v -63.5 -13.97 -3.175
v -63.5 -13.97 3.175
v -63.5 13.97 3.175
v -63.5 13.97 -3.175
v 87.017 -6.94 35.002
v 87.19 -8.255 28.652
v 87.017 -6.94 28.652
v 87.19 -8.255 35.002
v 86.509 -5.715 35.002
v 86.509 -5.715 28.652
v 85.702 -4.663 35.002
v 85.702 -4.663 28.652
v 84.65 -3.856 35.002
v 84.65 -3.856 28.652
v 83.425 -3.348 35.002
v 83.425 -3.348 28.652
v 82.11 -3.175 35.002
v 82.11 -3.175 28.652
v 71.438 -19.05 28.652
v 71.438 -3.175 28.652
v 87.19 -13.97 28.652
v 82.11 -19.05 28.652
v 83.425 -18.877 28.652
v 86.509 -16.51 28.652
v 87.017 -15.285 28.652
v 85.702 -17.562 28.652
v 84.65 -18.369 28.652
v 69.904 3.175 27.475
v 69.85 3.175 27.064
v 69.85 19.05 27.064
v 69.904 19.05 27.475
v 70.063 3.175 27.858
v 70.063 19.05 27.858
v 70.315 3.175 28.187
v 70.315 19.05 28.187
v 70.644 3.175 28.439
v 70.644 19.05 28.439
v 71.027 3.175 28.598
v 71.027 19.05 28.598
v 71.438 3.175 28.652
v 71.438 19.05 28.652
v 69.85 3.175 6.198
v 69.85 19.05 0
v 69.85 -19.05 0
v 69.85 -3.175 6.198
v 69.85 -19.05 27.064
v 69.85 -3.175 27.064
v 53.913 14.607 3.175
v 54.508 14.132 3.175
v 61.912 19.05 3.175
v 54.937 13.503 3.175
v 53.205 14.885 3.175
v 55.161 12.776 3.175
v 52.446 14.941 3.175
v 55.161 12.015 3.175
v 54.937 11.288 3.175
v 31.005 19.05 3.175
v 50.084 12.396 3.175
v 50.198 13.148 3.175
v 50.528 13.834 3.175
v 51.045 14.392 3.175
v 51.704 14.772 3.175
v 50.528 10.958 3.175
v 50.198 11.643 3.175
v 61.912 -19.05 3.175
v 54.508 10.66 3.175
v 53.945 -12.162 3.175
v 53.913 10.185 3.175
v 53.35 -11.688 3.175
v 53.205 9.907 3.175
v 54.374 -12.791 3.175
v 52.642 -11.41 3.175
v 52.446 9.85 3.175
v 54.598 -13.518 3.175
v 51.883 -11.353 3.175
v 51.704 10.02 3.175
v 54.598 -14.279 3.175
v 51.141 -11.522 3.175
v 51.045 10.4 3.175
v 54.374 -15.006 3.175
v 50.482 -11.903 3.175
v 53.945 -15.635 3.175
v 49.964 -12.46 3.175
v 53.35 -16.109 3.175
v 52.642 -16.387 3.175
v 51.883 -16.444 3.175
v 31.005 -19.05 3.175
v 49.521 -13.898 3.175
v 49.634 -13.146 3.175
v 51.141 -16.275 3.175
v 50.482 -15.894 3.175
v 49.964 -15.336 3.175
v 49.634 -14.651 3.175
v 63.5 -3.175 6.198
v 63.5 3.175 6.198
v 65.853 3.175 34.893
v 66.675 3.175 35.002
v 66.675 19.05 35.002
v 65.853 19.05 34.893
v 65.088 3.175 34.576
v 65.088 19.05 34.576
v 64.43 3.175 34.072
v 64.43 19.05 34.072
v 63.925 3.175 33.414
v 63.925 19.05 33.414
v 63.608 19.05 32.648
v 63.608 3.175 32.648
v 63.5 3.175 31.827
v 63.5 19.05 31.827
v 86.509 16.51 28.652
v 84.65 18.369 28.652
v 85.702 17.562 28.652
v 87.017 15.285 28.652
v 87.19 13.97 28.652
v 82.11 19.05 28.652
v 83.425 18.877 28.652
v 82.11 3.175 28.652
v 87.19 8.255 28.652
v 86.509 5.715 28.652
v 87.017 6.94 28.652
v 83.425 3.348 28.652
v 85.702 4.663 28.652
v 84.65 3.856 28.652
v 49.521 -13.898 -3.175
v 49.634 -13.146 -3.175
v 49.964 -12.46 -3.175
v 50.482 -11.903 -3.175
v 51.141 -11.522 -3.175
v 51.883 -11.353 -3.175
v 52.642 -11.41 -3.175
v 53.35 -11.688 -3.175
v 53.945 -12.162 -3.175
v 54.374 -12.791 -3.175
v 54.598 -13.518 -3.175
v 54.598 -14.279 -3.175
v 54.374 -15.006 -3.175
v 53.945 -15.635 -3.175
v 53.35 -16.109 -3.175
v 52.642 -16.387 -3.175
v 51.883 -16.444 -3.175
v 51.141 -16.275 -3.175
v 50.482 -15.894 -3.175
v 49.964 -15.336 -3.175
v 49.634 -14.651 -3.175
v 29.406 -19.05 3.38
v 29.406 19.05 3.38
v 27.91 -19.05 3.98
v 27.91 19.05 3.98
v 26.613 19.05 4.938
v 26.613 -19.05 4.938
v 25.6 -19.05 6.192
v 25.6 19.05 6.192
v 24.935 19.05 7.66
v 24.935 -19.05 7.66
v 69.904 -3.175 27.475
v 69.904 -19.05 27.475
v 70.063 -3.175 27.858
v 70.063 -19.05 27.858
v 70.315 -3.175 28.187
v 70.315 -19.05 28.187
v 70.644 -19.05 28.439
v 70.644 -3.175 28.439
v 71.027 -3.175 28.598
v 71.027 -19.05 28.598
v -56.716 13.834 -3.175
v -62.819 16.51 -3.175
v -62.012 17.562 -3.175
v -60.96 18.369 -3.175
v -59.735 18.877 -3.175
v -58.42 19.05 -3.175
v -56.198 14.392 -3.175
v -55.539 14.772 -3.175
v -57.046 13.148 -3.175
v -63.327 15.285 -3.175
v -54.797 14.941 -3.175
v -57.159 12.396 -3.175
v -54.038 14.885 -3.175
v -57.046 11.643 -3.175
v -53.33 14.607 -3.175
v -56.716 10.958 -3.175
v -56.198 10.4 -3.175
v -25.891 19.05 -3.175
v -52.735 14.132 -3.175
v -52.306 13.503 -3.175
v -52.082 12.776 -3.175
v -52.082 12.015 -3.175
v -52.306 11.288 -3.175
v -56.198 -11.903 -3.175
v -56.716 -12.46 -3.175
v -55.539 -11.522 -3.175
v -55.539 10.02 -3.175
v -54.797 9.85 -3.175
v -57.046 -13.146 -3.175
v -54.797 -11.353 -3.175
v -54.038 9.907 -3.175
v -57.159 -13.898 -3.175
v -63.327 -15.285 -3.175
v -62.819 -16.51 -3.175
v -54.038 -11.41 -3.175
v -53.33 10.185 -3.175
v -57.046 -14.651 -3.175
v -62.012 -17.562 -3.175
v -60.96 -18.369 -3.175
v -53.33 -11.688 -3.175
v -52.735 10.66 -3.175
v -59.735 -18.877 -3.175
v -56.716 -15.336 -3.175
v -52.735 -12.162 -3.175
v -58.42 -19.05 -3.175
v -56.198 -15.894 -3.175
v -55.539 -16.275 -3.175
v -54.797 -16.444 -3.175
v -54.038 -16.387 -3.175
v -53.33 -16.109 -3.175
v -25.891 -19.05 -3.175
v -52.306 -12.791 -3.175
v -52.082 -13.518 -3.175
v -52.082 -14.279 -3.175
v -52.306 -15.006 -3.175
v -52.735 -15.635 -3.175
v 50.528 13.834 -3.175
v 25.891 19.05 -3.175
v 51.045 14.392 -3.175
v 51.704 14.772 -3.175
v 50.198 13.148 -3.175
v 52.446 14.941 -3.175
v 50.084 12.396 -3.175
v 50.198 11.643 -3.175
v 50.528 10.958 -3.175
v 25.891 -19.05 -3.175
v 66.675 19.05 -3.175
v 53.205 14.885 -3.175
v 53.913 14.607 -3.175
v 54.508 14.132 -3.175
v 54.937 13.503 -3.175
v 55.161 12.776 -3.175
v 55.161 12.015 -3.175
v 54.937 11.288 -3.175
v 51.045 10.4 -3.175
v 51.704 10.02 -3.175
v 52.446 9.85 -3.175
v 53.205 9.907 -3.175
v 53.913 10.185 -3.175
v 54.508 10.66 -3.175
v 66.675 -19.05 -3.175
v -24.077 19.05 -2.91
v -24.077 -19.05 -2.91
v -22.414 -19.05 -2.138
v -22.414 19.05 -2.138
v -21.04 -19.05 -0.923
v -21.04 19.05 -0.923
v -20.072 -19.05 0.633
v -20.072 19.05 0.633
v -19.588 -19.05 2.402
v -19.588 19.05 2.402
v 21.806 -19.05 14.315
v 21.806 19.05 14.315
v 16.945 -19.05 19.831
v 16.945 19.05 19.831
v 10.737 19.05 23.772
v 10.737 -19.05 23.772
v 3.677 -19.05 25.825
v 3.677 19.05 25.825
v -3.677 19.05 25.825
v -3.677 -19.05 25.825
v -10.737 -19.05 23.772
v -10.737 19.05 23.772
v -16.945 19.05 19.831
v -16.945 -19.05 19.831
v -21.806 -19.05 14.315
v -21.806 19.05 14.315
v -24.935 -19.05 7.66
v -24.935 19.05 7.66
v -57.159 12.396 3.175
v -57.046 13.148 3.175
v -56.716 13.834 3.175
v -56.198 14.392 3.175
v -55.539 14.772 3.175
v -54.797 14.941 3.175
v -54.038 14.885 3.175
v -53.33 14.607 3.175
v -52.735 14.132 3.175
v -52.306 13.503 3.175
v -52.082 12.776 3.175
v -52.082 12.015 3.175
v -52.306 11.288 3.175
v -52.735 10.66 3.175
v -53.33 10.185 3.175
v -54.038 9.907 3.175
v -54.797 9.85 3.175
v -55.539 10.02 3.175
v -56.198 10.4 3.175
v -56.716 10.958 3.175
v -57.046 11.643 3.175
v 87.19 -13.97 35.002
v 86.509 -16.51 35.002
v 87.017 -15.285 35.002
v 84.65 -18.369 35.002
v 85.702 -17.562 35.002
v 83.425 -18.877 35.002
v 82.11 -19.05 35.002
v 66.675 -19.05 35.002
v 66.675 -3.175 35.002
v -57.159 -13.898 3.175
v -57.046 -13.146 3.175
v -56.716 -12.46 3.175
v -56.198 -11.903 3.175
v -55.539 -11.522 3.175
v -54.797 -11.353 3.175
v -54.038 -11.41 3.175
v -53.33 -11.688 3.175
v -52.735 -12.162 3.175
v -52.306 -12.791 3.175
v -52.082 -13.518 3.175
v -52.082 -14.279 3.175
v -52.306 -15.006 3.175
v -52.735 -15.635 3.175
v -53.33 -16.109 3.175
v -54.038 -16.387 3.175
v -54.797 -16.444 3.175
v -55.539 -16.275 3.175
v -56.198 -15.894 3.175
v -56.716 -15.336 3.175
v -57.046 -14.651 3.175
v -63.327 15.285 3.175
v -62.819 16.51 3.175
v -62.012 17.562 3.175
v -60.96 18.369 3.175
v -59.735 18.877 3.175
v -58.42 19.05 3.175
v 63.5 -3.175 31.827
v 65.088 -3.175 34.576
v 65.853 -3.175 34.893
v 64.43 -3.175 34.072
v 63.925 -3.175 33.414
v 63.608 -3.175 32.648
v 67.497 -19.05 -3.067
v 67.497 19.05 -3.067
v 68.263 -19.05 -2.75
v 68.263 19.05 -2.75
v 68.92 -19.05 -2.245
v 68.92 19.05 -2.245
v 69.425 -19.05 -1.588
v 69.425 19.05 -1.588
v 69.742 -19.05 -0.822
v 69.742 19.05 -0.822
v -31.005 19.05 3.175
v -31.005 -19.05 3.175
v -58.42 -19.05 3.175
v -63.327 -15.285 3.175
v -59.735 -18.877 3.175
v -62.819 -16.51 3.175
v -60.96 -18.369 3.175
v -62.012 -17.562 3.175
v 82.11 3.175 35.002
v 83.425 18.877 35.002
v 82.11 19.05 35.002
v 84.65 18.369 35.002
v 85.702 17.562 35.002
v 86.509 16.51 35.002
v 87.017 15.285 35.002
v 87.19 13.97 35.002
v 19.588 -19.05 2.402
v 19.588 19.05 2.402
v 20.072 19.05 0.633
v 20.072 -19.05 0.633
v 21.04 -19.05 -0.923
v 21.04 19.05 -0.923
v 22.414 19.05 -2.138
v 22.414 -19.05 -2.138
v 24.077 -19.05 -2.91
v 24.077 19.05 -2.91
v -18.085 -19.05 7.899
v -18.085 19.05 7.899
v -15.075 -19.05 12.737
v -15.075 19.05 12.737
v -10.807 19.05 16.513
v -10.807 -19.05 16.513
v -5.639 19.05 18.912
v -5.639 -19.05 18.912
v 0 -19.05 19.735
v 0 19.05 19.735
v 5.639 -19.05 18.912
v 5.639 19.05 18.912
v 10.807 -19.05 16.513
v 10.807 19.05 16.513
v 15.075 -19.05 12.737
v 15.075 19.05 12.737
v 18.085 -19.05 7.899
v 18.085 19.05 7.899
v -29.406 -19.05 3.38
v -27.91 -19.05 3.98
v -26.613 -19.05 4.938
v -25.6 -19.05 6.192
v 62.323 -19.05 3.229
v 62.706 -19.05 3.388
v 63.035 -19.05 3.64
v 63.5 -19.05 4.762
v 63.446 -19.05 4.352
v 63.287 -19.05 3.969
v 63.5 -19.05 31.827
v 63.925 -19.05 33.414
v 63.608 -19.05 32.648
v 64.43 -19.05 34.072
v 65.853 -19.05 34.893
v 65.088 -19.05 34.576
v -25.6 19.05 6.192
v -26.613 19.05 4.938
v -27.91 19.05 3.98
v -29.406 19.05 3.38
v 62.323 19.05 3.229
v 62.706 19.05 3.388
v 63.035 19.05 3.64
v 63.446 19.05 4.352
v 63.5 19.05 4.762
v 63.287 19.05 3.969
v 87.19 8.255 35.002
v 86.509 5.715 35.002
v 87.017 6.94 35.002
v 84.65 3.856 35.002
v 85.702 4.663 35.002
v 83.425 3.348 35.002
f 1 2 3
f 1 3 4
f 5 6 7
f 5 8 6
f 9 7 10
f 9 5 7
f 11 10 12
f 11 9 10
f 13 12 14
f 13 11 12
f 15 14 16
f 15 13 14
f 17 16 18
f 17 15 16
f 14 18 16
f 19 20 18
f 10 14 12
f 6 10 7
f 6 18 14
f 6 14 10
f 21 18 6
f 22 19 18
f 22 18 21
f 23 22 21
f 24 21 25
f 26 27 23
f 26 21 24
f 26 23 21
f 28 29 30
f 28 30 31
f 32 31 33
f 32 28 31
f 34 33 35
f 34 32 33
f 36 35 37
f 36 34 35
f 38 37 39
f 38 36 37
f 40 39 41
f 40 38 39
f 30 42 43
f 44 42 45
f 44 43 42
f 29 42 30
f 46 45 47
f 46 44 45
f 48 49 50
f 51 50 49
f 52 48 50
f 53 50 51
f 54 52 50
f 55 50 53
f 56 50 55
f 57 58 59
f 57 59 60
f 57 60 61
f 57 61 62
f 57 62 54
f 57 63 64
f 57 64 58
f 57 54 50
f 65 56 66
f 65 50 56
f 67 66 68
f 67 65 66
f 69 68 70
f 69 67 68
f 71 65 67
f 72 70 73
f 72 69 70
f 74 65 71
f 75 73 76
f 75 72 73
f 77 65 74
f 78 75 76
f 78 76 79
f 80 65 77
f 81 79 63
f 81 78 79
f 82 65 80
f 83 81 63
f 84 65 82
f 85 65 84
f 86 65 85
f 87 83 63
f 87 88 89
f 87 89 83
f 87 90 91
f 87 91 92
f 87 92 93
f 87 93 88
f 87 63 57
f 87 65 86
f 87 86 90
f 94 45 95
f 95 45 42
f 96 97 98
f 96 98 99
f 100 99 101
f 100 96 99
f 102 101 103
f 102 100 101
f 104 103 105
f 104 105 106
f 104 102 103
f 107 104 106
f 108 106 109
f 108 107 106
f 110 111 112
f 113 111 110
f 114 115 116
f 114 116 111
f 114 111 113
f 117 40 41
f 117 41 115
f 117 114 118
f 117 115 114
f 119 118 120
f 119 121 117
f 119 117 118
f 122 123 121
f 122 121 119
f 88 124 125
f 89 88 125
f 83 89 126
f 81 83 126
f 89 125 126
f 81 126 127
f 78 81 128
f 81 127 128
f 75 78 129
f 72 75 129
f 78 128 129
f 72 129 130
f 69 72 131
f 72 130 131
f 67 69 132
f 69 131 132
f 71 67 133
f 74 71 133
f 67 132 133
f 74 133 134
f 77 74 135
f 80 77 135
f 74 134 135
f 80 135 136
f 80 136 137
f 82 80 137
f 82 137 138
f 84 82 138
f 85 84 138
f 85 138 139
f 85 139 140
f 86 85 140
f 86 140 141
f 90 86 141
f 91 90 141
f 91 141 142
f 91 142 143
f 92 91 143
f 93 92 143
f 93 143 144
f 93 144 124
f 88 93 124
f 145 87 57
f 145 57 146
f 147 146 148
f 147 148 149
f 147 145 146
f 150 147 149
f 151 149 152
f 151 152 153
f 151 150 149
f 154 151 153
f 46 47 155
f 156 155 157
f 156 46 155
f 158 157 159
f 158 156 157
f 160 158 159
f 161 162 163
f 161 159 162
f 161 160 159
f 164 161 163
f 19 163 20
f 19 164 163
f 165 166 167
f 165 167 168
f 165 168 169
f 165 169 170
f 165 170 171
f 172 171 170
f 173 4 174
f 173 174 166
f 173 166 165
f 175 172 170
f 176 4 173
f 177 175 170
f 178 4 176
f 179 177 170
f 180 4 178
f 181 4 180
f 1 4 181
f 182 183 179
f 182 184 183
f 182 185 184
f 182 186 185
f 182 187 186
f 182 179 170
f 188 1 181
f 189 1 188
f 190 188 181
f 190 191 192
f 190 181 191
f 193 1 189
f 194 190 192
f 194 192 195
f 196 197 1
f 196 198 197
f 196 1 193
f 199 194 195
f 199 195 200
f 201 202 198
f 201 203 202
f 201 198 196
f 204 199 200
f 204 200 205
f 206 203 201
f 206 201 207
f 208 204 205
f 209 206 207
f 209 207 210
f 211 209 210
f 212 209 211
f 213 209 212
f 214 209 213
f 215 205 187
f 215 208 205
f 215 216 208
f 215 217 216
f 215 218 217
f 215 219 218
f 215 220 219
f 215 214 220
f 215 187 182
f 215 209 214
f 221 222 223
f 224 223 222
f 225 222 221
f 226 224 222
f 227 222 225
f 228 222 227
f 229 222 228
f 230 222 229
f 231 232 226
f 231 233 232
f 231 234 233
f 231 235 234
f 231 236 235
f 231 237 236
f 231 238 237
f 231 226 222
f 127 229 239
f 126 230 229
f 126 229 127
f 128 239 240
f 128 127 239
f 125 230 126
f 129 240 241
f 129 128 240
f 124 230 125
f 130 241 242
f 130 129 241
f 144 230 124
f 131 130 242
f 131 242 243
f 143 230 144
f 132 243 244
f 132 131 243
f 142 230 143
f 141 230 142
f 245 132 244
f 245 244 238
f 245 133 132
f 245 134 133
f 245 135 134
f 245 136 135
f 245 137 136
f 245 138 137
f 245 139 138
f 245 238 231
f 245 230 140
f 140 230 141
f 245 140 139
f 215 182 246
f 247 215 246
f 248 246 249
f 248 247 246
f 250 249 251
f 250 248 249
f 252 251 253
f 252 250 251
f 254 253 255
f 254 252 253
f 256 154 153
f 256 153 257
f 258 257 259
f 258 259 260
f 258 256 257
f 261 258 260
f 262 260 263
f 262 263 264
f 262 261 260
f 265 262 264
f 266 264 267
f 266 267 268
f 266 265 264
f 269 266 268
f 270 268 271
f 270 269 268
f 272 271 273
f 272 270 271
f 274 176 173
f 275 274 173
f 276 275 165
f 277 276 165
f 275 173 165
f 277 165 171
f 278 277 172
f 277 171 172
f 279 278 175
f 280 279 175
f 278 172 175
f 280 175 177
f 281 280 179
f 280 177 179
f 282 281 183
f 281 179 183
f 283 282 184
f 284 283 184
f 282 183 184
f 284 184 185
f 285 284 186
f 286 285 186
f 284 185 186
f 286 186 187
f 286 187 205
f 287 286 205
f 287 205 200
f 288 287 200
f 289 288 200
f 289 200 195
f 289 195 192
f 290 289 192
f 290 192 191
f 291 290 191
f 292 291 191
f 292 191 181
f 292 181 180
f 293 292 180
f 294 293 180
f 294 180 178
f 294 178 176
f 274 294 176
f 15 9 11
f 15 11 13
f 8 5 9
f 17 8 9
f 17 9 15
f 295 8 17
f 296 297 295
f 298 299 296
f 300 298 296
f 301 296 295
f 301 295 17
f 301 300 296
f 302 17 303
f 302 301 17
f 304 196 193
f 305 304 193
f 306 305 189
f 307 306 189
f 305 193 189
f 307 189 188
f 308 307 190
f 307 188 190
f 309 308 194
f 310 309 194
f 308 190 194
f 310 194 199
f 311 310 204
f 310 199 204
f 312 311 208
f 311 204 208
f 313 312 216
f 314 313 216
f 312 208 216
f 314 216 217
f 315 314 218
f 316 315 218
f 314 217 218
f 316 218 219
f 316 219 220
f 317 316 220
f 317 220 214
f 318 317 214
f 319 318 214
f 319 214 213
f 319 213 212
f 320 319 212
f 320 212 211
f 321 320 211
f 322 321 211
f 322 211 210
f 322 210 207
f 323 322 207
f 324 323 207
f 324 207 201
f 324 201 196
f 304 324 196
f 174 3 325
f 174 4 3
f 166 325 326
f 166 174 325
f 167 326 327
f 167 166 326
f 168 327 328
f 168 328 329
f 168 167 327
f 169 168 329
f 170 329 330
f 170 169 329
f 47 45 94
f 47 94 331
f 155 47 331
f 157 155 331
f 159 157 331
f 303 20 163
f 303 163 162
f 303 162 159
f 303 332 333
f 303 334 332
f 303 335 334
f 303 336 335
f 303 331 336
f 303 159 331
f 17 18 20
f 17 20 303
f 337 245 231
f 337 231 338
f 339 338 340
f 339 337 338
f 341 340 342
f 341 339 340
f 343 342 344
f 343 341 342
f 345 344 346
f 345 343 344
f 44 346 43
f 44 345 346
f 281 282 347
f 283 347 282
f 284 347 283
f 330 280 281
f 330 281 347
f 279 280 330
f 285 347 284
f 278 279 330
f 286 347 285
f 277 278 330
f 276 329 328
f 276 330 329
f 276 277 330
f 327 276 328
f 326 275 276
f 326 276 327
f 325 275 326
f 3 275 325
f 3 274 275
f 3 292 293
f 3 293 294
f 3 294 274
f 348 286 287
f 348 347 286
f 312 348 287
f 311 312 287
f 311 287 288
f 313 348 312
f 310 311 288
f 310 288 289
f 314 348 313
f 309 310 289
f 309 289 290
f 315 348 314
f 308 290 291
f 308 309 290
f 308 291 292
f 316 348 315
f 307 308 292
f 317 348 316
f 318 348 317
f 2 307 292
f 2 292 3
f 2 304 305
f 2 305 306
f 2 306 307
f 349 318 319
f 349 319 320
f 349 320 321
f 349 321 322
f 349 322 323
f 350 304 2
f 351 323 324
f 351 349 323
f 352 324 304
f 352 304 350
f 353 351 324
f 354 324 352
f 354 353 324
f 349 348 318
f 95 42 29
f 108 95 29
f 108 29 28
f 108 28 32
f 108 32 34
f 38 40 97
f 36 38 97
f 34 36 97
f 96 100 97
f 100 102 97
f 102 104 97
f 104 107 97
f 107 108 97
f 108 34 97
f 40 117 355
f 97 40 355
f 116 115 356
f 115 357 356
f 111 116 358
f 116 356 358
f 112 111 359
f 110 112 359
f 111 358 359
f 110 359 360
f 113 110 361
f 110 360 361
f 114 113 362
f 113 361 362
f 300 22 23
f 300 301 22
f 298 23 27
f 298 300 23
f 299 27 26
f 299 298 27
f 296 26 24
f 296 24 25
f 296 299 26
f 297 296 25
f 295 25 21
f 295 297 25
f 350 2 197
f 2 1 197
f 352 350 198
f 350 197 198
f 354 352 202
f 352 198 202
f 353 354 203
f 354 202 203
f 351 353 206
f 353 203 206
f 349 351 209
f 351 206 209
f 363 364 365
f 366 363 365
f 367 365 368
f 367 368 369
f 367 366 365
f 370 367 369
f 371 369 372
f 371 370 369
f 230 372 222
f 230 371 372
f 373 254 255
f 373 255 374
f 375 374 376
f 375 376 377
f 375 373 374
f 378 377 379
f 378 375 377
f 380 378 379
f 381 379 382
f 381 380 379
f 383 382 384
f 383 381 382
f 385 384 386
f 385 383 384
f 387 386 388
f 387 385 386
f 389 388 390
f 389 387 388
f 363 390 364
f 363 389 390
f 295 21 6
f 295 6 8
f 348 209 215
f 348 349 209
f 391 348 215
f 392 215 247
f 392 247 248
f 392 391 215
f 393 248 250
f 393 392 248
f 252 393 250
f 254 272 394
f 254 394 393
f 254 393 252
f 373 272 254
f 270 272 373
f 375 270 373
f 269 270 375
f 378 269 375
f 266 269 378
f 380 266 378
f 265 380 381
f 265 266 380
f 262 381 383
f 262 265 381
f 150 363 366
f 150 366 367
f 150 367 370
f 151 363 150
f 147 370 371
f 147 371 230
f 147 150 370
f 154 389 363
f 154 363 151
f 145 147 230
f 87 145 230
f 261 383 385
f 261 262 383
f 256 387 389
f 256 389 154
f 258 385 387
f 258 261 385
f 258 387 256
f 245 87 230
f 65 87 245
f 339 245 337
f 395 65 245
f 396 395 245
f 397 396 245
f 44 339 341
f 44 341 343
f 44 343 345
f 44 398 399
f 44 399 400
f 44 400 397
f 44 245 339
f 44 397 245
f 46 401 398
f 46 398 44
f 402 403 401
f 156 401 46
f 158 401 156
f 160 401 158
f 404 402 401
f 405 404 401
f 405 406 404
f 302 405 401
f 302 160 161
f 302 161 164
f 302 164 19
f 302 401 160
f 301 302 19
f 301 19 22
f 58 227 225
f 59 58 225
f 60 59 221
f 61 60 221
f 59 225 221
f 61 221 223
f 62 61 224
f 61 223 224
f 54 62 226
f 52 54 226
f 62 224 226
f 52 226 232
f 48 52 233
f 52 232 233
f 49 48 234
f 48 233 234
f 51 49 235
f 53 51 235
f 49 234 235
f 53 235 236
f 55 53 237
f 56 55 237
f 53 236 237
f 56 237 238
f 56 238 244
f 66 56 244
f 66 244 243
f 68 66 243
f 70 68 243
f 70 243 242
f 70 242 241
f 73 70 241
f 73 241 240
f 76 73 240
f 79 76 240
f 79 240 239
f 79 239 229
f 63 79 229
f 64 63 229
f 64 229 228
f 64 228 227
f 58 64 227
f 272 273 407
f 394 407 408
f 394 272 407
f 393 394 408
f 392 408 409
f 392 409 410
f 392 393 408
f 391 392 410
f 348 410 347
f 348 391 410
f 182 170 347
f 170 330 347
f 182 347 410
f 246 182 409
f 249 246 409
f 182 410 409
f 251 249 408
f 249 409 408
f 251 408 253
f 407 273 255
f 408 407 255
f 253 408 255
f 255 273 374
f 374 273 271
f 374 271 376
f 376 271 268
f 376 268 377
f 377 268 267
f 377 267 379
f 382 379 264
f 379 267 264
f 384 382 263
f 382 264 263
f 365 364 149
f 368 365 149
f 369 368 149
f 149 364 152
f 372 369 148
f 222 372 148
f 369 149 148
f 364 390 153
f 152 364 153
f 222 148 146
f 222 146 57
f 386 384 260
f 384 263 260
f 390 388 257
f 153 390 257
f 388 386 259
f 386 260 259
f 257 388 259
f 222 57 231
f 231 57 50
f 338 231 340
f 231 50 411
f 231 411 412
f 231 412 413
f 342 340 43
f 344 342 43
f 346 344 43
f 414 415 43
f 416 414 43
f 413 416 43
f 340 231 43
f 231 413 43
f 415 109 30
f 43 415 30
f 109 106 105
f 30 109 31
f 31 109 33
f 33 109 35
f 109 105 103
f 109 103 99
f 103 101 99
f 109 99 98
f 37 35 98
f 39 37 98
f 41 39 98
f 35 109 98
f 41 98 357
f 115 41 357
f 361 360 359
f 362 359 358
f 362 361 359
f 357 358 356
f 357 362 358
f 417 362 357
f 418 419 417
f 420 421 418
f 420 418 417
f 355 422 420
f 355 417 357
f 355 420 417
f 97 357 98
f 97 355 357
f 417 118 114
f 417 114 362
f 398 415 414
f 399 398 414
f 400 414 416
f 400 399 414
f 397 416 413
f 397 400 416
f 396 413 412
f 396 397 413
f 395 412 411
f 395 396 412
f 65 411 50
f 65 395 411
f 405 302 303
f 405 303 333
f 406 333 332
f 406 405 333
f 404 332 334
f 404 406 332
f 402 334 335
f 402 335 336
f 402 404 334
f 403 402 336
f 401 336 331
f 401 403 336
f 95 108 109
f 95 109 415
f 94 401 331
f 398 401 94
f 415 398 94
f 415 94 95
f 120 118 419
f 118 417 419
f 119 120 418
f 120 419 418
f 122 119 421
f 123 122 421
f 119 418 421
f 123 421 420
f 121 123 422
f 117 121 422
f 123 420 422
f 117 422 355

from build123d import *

# Parameters (mm, degrees)
F1_DEPTH = 19.05
F2_W     = 6.35
F2_H     = 28.8036865525
F3_DEPTH = 25.4
F4_R     = 5.08
F6_D     = 5.1054


# Not quite as in the source:
# - a feature names something its author has since deleted; it is built from what else it names


with BuildPart() as f1:
    # F0 (on Front) → F1 (new body, symmetric)
    with BuildSketch(Plane.XZ):
        with BuildLine():
            Line((-63.5, 3.175), (-63.5, -3.175))
            Line((-63.5, -3.175), (-25.8909725642, -3.175))
            ThreePointArc((-25.8909725642, -3.175), (-21.6829722848, -1.5805476707), (-19.5881864455, 2.4020917642))
            ThreePointArc((-19.5881864455, 2.4020917642), (0, 19.7349206501), (19.5881864455, 2.4020917642))
            ThreePointArc((19.5881864455, 2.4020917642), (21.6829722848, -1.5805476707), (25.8909725642, -3.175))
            Line((25.8909725642, -3.175), (63.5, -3.175))
            Line((63.5, -3.175), (66.675, -3.175))
            ThreePointArc((66.675, -3.175), (68.9200640303, -2.2450640303), (69.85, 0))
            Line((69.85, 0), (69.85, 27.0641443402))
            ThreePointArc((69.85, 27.0641443402), (70.3149679849, 28.1866763553), (71.4375, 28.6516443402))
            Line((71.4375, 28.6516443402), (87.1900793672, 28.6516443402))
            Line((87.1900793672, 28.6516443402), (87.1900793672, 35.0016443402))
            Line((87.1900793672, 35.0016443402), (66.675, 35.0016443402))
            ThreePointArc((66.675, 35.0016443402), (64.4299359697, 34.0717083704), (63.5, 31.8266443402))
            Line((63.5, 31.8266443402), (63.5, 4.7625))
            ThreePointArc((63.5, 4.7625), (63.0350320151, 3.6399679849), (61.9125, 3.175))
            Line((61.9125, 3.175), (31.0048133776, 3.175))
            ThreePointArc((31.0048133776, 3.175), (27.2311418069, 4.4179555635), (24.9347949838, 7.6602274404))
            ThreePointArc((24.9347949838, 7.6602274404), (0, 26.0849206501), (-24.9347949838, 7.6602274404))
            ThreePointArc((-24.9347949838, 7.6602274404), (-27.2311418069, 4.4179555635), (-31.0048133776, 3.175))
            Line((-31.0048133776, 3.175), (-63.5, 3.175))
        make_face()
    extrude(amount=F1_DEPTH, both=True)

    # F2 (on face) → F3 (cut)
    with BuildSketch(Plane.YZ.offset(87.1900793672)):
        with Locations((0, 20.5998010639)):
            Rectangle(F2_W, F2_H)
    extrude(amount=-F3_DEPTH, mode=Mode.SUBTRACT)

    # F4
    f4_edges = [f1.edges().sort_by_distance(p)[0] for p in [
        (-63.5, -19.05, 0),
        (-63.5, 19.05, 0),
        (87.190079, 19.05, 31.826644),
        (87.190079, 3.175, 31.826644),
        (87.190079, -3.175, 31.826644),
        (87.190079, -19.05, 31.826644),
    ]]
    fillet(f4_edges, radius=F4_R)

    # F6 (through all)
    with Locations(Plane.XY.offset(3.175)):
        with Locations((-54.6063743532, 12.3959155753), (-54.6063743532, -13.8984508812), (52.6370815933, 12.3959155753), (52.0736314356, -13.8984508812)):
            Hole(F6_D / 2)


solid = f1.part
